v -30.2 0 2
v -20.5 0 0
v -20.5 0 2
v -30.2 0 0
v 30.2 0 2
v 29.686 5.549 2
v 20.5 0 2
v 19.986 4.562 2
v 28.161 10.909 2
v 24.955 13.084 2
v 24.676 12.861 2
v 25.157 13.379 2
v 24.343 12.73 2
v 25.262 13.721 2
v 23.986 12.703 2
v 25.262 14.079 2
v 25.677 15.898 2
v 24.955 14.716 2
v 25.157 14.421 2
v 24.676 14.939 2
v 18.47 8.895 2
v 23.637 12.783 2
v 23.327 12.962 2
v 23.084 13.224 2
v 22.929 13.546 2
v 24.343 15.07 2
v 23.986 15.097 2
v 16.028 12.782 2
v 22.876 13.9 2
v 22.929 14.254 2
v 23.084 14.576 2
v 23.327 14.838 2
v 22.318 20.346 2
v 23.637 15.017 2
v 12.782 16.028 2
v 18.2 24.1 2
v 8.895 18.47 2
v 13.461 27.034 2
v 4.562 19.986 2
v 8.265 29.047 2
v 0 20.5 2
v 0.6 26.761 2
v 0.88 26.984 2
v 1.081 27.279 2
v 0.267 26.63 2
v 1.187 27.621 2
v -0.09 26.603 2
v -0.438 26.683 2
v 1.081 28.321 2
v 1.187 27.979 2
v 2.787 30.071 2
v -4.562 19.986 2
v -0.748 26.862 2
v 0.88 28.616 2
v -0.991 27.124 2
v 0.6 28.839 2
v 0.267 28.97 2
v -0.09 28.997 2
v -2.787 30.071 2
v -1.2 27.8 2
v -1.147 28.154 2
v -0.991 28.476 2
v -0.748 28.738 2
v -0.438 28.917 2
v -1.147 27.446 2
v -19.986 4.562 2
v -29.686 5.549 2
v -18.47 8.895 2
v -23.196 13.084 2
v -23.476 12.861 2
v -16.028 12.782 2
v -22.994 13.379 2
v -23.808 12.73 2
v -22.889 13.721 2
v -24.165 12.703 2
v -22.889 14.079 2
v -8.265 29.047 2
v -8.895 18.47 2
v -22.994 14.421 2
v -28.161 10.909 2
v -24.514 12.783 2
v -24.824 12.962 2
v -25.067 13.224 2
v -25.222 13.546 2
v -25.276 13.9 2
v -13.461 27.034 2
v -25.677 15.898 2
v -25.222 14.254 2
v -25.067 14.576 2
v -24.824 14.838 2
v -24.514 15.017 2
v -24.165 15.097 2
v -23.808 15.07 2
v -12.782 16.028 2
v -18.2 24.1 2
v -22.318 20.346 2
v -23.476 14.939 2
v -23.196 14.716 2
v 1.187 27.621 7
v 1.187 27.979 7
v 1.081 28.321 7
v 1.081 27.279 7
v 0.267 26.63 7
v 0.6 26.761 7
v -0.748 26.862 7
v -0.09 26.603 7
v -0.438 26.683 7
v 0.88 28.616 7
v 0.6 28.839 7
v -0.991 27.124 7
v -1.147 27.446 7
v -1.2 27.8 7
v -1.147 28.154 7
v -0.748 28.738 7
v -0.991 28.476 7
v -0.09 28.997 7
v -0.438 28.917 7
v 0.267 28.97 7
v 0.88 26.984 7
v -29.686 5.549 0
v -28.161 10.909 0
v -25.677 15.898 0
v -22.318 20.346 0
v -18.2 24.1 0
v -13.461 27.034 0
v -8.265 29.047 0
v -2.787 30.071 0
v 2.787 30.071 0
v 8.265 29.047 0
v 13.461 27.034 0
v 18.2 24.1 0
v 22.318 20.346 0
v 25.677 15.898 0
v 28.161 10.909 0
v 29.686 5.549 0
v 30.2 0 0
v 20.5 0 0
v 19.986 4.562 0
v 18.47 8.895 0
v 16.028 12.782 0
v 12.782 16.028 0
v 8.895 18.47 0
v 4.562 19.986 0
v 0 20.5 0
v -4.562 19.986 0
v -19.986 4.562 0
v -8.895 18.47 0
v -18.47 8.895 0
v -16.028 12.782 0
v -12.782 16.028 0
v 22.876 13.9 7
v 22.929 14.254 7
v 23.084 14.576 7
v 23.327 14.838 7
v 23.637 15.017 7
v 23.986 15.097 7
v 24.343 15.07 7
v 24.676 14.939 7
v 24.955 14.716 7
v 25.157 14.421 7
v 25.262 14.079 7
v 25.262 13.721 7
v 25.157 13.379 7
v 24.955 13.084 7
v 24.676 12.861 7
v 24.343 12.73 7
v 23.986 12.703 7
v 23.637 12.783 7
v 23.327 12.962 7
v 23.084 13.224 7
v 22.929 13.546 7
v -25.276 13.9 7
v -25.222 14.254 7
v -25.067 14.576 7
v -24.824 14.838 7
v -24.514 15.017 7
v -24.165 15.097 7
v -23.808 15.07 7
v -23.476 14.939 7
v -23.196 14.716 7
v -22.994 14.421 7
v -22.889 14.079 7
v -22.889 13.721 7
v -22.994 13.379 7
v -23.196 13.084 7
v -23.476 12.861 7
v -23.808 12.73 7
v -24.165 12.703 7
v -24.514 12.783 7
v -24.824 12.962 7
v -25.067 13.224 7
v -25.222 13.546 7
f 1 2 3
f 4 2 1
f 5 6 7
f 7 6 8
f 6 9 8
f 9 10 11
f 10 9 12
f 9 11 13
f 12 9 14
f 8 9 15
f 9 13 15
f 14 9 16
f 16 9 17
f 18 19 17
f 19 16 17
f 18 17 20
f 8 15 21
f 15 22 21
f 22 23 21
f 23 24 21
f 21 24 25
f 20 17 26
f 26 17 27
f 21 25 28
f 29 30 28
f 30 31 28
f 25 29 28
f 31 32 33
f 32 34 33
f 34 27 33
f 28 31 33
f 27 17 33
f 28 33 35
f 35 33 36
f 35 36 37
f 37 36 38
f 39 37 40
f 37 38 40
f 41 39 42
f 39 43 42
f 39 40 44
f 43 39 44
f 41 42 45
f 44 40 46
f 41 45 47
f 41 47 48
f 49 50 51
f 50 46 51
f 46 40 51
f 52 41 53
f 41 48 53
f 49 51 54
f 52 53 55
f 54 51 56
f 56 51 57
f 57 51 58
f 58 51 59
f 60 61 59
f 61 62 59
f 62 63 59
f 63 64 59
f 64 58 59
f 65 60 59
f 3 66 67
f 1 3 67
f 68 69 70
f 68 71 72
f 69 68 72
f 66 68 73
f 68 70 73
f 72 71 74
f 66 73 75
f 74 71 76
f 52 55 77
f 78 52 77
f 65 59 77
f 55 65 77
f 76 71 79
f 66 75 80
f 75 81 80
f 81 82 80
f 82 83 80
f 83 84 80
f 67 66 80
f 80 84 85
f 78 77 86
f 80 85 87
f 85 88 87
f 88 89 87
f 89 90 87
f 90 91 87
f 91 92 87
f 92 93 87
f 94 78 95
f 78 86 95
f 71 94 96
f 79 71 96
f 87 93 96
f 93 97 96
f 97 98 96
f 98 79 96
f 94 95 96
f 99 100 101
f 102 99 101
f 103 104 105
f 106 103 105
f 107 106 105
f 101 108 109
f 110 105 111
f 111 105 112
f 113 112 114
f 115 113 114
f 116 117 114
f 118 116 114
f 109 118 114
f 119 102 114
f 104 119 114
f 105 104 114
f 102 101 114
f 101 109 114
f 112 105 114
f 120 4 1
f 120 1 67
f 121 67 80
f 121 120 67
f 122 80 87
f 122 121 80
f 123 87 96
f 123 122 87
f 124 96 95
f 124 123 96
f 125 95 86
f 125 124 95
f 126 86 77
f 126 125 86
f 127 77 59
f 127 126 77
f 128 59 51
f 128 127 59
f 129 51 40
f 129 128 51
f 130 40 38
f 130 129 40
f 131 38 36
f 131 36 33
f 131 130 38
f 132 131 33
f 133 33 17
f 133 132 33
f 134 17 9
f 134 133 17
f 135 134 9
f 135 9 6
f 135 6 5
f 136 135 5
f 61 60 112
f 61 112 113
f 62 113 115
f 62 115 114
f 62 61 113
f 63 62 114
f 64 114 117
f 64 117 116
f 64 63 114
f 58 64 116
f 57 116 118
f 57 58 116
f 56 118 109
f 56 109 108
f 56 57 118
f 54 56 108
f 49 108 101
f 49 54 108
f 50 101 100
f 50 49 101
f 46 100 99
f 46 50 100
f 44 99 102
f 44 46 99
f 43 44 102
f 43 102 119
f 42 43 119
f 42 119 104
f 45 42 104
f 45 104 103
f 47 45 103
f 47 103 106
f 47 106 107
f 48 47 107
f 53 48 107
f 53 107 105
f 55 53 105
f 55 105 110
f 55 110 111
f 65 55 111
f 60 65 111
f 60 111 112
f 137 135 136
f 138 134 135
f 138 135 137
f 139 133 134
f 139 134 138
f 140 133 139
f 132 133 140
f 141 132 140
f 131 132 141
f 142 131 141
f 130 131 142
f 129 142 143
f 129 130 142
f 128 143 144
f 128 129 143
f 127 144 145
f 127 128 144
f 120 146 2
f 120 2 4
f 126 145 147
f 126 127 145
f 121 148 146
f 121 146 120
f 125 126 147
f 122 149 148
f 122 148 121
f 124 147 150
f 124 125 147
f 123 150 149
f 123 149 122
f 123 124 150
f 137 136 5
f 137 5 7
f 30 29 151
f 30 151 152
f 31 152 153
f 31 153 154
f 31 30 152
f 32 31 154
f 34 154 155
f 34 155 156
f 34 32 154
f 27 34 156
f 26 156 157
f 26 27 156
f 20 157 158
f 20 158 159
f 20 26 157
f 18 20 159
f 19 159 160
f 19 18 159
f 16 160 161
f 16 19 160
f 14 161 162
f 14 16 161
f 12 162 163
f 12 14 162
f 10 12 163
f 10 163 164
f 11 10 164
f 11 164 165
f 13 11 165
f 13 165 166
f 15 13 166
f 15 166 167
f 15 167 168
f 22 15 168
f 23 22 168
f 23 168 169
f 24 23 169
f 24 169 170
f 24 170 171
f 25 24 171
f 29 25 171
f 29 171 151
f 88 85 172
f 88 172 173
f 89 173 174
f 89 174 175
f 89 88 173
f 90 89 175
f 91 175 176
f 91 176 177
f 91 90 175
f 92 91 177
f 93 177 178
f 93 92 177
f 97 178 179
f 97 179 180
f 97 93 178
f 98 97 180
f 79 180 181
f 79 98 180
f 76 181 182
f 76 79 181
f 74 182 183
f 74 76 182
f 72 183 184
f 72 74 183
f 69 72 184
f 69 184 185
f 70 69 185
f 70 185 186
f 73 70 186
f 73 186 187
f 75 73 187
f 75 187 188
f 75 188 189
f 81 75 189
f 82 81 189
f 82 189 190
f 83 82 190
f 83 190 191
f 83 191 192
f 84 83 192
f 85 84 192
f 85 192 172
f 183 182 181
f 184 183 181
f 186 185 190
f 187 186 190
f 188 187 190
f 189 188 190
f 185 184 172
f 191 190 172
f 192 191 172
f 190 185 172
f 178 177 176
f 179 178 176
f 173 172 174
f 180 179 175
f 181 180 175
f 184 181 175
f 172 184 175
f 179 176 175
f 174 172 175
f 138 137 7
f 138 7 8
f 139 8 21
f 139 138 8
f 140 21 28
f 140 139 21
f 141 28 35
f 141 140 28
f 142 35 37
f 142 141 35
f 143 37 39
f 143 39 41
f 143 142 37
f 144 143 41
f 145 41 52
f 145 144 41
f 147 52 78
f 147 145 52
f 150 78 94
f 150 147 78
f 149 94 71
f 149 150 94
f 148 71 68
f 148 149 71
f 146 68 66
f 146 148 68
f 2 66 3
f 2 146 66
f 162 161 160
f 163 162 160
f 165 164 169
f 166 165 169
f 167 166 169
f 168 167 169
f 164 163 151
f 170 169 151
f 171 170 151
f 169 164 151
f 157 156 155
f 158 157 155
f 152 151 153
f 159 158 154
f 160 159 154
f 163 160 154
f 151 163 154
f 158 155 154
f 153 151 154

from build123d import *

# Parameters (mm, degrees)
BOSS_EXTRUDE1_DEPTH = 2
SKETCH4_R           = 1.2
BOSS_EXTRUDE2_DEPTH = 7


with BuildPart() as part:
    # Sketch3 → Boss-Extrude1 (new body)
    with BuildSketch(Plane.XY):
        with BuildLine():
            Line((30.2, 0), (20.5, 0))
            ThreePointArc((20.5, 0), (0, 20.5), (-20.5, 0))
            Line((-20.5, 0), (-30.2, 0))
            ThreePointArc((-30.2, 0), (0, 30.2), (30.2, 0))
        make_face()
    extrude(amount=BOSS_EXTRUDE1_DEPTH)

    # Sketch4 → Boss-Extrude2 (add)
    with BuildSketch(Plane(origin=(0, 0, 0), x_dir=(-1, 0, 0), z_dir=(0, 0, -1))):
        with Locations((0, 27.800000001)):
            Circle(SKETCH4_R)
        with Locations((24.075506226, 13.9)):
            Circle(SKETCH4_R)
        with Locations((-24.075506226, 13.9)):
            Circle(SKETCH4_R)
    extrude(amount=-BOSS_EXTRUDE2_DEPTH)


solid = part.part
